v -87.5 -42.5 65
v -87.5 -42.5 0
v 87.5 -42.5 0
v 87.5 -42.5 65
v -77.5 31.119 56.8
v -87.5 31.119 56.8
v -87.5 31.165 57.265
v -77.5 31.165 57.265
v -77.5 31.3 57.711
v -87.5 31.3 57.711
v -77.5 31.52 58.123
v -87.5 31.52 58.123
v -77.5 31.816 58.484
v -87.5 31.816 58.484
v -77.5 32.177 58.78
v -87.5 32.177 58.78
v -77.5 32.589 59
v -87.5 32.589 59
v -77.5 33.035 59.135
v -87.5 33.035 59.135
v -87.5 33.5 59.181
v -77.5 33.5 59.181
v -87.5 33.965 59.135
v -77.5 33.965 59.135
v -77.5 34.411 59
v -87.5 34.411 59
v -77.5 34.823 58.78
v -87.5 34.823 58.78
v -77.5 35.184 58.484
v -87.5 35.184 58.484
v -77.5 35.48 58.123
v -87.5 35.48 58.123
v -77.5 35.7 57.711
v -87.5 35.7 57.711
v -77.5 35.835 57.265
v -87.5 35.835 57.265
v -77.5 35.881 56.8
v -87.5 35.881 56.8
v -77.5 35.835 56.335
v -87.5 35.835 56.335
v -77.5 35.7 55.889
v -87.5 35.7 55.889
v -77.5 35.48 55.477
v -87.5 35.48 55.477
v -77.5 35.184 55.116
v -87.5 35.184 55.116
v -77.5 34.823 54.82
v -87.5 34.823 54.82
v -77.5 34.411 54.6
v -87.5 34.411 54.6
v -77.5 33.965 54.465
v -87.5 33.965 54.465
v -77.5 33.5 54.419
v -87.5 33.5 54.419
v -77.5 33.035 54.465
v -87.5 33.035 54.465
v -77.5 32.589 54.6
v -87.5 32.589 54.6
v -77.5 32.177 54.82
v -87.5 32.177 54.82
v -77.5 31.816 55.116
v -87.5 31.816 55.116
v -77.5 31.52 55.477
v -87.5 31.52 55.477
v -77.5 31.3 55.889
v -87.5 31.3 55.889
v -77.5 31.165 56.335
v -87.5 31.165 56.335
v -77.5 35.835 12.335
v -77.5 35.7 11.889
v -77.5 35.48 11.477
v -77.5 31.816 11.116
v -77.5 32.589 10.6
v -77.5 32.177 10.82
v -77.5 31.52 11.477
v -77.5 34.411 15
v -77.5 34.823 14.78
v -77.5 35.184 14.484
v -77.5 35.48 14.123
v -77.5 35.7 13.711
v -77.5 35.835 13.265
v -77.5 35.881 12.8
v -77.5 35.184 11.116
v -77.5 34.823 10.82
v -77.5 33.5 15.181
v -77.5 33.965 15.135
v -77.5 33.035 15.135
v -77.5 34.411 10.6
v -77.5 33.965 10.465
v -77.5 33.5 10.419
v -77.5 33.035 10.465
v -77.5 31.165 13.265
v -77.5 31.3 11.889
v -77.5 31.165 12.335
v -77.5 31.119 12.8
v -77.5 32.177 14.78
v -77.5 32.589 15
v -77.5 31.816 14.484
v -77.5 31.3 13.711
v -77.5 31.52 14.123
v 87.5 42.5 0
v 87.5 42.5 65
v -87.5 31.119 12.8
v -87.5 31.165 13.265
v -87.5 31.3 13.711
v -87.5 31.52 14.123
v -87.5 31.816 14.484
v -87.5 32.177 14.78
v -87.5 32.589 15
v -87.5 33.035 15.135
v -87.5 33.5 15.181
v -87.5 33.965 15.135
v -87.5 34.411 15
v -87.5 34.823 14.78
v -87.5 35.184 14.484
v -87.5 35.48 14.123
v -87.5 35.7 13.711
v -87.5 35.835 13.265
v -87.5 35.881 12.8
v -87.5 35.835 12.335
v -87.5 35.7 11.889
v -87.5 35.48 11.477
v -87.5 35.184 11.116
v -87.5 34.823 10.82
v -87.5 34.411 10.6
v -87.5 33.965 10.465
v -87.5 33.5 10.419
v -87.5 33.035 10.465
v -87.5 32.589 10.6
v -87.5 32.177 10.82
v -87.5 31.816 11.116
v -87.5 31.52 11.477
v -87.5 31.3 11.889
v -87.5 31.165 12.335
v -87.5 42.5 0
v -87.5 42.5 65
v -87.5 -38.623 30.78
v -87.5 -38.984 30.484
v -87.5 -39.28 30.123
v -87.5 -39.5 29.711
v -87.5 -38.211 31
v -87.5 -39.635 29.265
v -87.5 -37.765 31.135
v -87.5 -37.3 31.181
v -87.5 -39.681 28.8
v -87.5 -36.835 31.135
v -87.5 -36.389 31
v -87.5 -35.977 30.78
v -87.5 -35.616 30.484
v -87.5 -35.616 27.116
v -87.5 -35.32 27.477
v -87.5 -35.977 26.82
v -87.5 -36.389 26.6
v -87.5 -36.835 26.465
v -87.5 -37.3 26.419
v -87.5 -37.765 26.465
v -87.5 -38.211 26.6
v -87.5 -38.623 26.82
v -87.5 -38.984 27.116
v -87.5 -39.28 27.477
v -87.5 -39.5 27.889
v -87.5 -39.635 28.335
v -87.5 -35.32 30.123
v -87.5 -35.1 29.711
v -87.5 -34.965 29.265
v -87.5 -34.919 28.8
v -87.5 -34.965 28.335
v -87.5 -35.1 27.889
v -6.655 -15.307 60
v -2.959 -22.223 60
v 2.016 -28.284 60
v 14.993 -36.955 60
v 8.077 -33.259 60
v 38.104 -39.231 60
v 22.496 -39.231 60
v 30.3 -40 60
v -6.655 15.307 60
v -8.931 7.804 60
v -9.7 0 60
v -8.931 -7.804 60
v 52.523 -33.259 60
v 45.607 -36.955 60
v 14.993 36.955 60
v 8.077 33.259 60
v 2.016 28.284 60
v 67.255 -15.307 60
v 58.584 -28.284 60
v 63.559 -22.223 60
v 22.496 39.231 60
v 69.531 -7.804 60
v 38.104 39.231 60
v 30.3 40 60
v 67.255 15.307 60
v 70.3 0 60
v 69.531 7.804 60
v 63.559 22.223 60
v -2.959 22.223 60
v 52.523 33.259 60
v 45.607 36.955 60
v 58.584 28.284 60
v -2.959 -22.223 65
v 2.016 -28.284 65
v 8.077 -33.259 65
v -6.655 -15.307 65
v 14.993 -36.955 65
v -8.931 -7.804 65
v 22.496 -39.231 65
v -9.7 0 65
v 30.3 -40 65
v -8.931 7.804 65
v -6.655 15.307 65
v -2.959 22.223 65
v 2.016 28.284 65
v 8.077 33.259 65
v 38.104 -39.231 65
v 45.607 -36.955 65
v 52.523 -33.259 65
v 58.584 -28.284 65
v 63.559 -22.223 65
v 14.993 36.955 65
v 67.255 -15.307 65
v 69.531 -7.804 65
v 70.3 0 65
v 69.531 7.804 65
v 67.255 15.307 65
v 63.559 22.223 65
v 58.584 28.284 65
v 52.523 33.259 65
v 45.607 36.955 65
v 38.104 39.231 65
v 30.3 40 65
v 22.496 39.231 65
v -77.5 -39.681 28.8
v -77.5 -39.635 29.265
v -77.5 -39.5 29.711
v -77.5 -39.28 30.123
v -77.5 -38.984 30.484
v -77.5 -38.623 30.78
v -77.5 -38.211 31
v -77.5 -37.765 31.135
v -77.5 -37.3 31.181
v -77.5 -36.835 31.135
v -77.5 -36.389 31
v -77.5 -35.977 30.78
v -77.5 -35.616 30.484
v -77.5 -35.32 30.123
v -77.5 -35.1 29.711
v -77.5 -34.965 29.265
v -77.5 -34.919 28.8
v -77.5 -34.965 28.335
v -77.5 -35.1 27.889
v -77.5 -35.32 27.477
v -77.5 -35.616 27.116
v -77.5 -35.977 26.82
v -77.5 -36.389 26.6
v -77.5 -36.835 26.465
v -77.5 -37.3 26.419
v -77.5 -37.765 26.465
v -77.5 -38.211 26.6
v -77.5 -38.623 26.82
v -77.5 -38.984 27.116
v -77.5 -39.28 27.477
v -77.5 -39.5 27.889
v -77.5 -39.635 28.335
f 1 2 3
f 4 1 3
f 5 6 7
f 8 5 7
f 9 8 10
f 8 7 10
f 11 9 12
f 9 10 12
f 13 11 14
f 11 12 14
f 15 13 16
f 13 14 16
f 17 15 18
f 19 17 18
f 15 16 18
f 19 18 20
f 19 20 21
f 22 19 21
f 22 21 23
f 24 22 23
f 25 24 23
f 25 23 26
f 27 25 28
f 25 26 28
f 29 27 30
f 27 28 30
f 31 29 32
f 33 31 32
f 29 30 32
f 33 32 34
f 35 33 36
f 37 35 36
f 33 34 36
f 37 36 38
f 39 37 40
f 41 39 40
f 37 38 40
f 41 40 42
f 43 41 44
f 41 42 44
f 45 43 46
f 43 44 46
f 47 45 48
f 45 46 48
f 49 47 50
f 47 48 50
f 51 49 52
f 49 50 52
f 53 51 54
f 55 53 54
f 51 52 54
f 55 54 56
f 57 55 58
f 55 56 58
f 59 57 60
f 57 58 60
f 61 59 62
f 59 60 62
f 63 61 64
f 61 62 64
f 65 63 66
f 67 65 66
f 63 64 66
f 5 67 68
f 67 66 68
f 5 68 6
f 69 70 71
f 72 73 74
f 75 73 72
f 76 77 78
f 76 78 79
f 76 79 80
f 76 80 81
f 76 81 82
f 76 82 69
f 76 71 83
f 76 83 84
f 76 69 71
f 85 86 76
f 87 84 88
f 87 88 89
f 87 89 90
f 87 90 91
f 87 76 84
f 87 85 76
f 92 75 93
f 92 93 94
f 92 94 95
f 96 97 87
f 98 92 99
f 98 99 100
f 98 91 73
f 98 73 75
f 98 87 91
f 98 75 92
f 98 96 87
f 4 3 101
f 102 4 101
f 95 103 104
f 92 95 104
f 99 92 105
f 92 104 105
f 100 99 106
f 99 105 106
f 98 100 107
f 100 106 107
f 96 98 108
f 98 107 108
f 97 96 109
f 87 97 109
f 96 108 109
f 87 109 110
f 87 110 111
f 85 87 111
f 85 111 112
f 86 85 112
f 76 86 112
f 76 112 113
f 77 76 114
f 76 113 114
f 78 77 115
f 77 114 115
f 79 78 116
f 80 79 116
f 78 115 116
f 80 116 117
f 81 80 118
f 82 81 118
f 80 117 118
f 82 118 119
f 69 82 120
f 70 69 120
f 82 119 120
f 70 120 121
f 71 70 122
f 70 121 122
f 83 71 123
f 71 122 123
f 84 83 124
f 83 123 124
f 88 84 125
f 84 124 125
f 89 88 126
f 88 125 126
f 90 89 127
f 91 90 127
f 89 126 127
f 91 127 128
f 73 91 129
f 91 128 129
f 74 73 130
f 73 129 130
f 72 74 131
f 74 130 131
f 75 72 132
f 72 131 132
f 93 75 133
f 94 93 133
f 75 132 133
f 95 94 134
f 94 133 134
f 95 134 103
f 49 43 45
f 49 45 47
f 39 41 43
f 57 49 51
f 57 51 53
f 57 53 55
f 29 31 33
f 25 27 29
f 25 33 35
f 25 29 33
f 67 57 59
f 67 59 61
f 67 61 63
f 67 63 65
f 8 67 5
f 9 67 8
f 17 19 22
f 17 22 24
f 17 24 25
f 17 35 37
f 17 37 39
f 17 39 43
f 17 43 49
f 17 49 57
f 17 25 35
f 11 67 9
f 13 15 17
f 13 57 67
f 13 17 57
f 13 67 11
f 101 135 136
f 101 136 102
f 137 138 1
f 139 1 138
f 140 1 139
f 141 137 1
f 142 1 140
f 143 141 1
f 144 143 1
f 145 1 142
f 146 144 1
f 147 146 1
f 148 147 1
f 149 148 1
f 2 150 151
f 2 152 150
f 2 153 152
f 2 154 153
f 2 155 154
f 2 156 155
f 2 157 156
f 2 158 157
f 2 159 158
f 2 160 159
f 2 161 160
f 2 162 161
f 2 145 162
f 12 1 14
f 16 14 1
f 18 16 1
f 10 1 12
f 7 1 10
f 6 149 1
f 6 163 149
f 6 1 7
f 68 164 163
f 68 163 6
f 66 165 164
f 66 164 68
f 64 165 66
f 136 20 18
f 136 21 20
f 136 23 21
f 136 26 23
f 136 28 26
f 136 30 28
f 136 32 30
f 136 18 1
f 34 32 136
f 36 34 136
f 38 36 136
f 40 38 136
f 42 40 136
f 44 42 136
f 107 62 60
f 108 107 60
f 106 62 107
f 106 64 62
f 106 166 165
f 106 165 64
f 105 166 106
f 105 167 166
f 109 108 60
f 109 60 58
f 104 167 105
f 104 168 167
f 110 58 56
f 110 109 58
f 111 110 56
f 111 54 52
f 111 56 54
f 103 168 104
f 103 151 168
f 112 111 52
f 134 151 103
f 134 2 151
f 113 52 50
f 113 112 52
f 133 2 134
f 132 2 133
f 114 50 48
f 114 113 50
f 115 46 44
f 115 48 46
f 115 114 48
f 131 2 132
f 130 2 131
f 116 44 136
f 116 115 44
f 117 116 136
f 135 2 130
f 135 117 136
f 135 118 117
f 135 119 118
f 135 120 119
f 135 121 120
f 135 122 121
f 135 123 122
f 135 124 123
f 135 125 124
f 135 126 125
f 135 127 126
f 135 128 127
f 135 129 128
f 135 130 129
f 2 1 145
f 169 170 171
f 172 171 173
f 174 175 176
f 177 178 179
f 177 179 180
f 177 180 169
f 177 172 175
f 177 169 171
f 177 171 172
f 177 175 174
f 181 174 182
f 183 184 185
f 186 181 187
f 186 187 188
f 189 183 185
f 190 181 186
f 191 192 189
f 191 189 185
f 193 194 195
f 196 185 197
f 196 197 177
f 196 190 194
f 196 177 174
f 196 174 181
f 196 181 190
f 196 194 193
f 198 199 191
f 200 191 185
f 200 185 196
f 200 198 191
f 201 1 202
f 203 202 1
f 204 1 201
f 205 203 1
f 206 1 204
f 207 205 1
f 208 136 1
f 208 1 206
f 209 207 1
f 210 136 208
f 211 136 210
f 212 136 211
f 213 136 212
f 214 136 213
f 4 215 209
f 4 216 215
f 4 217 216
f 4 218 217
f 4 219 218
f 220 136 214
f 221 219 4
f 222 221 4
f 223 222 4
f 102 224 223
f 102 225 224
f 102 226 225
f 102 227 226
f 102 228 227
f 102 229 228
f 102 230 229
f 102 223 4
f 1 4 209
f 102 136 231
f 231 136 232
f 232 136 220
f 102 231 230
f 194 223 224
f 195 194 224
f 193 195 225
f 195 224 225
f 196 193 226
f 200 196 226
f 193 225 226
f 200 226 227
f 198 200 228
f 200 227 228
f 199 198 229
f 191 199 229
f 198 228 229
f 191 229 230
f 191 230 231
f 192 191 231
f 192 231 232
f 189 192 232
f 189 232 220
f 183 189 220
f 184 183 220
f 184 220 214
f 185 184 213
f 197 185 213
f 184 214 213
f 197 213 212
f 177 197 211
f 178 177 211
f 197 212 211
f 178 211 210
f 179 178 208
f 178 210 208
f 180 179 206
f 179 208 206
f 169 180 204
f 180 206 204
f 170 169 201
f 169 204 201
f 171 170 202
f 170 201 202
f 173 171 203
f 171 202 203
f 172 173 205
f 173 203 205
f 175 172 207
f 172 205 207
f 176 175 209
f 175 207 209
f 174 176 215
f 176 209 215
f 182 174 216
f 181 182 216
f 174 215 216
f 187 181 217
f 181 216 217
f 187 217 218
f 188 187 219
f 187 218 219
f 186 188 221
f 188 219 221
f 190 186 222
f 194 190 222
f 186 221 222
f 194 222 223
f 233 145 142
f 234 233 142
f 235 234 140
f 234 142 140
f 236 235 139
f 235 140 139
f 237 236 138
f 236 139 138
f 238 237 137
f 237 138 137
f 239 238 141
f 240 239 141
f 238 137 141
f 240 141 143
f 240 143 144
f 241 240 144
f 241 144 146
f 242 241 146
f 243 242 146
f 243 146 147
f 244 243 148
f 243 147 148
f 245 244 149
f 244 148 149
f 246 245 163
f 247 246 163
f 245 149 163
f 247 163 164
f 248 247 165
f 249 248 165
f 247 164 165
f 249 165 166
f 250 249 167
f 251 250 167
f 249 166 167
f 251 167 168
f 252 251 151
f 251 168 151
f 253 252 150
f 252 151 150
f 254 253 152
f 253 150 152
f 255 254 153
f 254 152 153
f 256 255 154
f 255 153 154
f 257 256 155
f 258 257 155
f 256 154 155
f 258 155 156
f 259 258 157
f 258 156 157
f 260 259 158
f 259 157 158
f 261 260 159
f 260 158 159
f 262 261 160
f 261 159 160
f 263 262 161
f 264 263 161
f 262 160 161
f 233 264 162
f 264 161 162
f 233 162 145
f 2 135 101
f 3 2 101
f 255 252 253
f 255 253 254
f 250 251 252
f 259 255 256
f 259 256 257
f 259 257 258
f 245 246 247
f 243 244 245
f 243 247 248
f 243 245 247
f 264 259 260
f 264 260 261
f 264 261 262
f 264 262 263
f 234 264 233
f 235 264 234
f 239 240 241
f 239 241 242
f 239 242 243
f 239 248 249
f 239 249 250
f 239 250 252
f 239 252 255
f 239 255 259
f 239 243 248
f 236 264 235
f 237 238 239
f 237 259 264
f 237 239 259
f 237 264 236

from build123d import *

# Parameters (mm, degrees)
F0_W     = 175
F0_H     = 85
F1_DEPTH = 65
F2_R     = 40
F3_DEPTH = 5
F4_R     = 2.38125
F5_DEPTH = 10


with BuildPart() as f1:
    # F0 (on Top) → F1 (new body)
    with BuildSketch(Plane.XY):
        Rectangle(F0_W, F0_H)
    extrude(amount=F1_DEPTH)

    # F2 (on face) → F3 (cut)
    with BuildSketch(Plane.XY.offset(65)):
        with Locations((30.3, 0)):
            Circle(F2_R)
    extrude(amount=-F3_DEPTH, mode=Mode.SUBTRACT)

    # F4 (on face) → F5 (cut)
    with BuildSketch(Plane(origin=(-87.5, 0, 0), x_dir=(0, -1, 0), z_dir=(-1, 0, 0))):
        with Locations((-33.5, 12.8)):
            Circle(F4_R)
        with Locations((-33.5, 56.8)):
            Circle(F4_R)
        with Locations((37.3, 28.8)):
            Circle(F4_R)
    extrude(amount=-F5_DEPTH, mode=Mode.SUBTRACT)


solid = f1.part
